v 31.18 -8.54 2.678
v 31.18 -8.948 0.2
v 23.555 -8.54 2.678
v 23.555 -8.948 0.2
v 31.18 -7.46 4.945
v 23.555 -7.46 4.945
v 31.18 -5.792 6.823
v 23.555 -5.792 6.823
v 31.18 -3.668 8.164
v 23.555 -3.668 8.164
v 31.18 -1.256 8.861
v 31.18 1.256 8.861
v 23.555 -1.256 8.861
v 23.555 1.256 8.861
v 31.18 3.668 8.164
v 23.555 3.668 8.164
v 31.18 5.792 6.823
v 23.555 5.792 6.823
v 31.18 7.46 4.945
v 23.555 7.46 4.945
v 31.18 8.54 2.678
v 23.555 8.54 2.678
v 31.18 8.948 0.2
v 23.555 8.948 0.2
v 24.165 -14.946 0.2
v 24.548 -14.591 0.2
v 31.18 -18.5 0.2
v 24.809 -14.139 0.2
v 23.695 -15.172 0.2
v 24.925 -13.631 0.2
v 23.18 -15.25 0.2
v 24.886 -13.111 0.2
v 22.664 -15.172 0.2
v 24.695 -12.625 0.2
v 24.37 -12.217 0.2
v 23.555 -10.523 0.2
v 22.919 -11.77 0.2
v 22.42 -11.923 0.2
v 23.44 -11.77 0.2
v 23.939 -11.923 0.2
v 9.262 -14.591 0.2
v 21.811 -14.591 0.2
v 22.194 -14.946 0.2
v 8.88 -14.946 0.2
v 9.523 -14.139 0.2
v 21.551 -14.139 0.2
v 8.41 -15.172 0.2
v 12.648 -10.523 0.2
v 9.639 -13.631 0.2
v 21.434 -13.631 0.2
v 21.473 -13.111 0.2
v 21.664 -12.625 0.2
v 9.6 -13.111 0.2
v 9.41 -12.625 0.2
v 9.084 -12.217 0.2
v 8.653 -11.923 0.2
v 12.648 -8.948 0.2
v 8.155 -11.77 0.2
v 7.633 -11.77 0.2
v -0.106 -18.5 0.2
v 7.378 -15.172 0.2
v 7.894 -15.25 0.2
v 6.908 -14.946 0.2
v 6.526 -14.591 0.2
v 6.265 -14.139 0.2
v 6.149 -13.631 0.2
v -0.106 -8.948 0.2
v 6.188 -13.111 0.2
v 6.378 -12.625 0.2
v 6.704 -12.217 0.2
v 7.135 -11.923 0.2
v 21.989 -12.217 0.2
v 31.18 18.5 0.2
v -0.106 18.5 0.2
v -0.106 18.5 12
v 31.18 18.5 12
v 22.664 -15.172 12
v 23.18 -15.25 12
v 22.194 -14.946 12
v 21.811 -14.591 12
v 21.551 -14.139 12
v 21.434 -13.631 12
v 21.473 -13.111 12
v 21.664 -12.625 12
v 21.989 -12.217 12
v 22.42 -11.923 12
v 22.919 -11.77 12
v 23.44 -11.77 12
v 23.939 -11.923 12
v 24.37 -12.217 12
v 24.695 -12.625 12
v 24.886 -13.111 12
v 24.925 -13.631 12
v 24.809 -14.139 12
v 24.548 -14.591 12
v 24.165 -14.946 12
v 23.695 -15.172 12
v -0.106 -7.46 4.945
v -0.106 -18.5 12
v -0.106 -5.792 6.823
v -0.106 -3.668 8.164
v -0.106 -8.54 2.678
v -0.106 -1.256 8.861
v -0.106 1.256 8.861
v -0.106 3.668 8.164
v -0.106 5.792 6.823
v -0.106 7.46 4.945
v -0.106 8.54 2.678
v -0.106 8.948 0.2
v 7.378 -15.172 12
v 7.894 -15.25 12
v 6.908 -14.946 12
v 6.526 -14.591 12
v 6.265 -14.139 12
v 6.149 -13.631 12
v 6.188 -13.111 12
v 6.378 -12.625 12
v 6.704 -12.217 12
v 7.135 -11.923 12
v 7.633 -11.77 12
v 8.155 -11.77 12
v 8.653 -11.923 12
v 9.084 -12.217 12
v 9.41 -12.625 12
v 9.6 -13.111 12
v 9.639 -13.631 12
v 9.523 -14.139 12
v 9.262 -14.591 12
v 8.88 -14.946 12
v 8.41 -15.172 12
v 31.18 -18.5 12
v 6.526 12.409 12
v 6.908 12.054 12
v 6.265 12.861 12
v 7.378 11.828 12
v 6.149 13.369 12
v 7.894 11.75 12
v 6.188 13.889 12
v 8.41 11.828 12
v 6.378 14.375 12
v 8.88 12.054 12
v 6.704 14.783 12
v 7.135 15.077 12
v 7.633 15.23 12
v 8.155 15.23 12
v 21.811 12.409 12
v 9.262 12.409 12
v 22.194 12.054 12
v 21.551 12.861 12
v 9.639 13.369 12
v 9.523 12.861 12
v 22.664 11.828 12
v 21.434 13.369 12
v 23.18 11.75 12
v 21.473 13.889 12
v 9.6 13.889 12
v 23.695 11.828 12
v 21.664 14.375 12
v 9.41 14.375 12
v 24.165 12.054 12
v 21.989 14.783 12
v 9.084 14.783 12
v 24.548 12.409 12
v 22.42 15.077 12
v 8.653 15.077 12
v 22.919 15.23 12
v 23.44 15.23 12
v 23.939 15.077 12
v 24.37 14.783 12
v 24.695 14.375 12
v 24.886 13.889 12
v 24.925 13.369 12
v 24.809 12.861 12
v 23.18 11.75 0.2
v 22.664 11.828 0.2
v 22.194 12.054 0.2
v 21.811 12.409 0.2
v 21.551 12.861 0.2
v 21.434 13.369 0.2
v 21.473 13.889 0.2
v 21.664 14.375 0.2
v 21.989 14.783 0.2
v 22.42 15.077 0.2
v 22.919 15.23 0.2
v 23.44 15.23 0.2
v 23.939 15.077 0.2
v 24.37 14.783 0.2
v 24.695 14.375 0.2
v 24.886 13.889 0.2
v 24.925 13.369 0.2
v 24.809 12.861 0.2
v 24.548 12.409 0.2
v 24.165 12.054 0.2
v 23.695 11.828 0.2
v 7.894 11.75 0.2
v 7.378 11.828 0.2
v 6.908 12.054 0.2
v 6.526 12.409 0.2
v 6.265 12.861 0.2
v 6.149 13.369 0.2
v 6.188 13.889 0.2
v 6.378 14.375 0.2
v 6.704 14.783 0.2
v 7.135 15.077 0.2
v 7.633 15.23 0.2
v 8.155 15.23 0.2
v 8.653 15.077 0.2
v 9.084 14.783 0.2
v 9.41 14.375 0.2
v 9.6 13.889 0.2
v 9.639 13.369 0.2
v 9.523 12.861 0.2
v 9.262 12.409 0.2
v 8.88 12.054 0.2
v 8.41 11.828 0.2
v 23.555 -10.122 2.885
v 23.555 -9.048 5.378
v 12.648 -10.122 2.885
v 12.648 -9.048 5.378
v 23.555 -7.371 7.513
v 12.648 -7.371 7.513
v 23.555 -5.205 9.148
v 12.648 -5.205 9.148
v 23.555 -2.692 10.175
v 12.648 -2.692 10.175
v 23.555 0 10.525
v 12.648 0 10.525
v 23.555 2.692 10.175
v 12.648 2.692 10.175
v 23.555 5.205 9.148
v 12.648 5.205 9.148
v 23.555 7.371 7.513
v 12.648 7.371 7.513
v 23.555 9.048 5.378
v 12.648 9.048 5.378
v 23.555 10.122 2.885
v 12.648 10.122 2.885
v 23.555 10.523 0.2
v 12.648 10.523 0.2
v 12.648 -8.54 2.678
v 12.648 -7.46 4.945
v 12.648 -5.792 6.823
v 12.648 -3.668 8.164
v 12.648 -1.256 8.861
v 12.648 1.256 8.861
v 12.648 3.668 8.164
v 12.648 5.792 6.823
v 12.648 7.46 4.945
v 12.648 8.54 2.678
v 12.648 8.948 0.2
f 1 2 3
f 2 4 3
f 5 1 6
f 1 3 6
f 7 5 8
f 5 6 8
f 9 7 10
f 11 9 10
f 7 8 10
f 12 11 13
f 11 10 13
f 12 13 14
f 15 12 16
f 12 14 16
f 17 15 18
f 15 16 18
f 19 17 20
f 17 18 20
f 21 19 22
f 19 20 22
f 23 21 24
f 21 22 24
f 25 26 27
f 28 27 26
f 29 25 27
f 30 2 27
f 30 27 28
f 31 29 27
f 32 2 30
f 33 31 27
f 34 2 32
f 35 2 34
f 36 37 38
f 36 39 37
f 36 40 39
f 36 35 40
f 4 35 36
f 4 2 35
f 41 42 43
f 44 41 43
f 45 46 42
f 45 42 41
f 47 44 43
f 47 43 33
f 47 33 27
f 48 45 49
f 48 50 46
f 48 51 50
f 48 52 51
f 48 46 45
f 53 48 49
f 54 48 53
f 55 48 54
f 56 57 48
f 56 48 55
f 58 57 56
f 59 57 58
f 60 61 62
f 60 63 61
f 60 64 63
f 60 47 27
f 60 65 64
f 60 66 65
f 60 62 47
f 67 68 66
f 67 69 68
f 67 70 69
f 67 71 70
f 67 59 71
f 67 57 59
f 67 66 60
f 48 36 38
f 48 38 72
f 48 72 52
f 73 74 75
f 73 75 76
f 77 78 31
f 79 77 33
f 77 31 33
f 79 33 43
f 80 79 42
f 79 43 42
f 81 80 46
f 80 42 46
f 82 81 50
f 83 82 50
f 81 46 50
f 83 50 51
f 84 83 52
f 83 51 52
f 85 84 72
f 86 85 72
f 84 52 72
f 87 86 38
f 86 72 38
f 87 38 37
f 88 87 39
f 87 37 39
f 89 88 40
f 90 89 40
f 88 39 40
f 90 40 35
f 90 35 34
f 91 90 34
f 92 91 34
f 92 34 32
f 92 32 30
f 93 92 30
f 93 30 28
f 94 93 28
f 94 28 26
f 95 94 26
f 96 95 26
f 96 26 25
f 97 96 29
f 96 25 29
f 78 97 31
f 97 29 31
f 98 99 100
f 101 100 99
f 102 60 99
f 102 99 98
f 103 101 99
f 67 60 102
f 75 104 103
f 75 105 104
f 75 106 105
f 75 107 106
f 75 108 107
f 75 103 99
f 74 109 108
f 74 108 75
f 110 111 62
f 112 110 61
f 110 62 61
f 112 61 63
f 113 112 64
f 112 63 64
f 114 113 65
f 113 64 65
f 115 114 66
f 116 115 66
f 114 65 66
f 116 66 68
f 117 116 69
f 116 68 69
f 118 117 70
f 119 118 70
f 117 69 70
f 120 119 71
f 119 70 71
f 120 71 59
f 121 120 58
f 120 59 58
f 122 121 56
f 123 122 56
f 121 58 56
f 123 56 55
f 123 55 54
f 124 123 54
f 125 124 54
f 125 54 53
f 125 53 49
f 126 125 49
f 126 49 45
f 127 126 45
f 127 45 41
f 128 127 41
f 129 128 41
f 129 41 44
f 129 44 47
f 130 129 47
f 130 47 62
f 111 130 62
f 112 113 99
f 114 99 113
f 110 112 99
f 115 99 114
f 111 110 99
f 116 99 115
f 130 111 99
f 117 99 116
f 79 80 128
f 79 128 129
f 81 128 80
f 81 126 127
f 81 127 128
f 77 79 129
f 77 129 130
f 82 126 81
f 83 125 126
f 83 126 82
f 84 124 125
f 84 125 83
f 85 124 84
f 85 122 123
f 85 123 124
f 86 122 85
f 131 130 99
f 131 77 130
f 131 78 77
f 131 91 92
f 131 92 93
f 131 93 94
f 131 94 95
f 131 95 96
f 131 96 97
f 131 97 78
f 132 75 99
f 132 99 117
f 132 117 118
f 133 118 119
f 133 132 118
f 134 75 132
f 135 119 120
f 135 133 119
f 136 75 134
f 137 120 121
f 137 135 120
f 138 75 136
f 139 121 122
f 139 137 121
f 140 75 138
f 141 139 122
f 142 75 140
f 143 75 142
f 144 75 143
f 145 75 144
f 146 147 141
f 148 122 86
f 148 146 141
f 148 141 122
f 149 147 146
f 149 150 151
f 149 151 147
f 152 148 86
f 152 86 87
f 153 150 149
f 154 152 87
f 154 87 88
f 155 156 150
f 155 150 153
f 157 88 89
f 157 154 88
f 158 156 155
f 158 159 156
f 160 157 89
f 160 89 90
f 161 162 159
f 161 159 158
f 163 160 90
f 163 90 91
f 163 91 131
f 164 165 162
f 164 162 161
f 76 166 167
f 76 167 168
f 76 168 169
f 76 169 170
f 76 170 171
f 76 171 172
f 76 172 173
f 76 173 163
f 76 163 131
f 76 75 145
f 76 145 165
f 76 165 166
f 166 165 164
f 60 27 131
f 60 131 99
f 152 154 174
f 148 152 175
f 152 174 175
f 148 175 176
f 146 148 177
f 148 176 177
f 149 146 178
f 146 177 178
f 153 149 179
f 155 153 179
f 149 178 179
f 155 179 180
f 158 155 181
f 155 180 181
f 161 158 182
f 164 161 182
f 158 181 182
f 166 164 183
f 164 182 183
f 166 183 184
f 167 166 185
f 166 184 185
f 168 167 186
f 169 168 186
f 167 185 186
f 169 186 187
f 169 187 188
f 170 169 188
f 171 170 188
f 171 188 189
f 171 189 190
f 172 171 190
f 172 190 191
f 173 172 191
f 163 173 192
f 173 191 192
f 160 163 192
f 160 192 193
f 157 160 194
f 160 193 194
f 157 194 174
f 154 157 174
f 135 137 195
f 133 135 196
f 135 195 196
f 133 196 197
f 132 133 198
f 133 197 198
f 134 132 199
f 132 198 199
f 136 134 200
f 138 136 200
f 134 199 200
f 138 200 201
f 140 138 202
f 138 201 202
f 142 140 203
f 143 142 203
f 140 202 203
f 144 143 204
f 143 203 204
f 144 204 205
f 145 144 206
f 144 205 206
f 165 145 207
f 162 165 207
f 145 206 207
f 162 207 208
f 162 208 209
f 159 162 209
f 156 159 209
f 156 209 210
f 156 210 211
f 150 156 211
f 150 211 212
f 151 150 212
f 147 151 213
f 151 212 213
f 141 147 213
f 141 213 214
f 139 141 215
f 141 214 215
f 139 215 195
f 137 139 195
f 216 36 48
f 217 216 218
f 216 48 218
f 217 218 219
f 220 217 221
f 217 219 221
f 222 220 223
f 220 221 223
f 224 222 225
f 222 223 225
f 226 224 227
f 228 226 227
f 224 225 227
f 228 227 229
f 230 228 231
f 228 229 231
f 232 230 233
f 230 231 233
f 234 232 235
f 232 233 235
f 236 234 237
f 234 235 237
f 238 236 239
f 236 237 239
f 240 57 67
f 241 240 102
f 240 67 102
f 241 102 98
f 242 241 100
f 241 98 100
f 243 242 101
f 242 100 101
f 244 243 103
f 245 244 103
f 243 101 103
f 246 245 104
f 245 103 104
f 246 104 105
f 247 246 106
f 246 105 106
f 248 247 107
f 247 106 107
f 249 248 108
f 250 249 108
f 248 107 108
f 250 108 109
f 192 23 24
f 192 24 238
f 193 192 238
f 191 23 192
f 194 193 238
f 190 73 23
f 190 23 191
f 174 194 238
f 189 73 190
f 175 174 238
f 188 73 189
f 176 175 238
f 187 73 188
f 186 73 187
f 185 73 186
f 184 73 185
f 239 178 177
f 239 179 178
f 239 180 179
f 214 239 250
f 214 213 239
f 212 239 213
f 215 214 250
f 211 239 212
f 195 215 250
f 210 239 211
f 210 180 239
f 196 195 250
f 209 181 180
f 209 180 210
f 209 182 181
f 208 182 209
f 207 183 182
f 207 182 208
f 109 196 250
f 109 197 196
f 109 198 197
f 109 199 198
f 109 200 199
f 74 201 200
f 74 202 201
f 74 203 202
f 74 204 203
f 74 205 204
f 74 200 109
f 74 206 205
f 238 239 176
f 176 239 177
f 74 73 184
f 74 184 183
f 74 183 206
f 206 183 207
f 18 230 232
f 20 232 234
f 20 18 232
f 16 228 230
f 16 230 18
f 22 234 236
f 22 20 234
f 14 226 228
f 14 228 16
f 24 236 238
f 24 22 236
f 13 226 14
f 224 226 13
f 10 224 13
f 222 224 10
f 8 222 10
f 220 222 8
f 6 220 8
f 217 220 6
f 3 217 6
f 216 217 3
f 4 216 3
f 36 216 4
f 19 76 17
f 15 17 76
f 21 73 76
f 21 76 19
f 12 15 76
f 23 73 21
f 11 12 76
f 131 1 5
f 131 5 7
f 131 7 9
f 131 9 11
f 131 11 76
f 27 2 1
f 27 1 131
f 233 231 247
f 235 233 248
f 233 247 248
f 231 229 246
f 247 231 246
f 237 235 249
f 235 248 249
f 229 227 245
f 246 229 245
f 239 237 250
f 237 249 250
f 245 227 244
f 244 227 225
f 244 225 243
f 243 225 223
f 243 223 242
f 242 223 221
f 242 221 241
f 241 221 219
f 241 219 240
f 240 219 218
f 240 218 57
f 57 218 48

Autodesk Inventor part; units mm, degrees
ref_plane "YZ Plane" through (0, 0, 0) normal (1, 0, 0) x (0, 1, 0)
ref_plane "XZ Plane" through (0, 0, 0) normal (0, 1, 0) x (-1, 0, 0)
ref_plane "Work Plane1" through (0, 0, 0) normal (0, 0, 1) x (1, 0, 0)
sketch "Sketch1" plane through (0, 0, 0) normal (0, 0, 1) x (1, 0, 0)
  circle A0 centre (13.9438, -25.4) radius 3.3782 construction
  line L0 (31.1796, -40) -> (-0.106, -40) construction
  line L1 (31.1796, -40) -> (31.1796, -8.95) construction
  line L2 (31.1796, -8.95) -> (23.5548, -8.95) construction
  line L3 (23.5548, -8.95) -> (23.5548, -10.525) construction
  line L4 (23.5548, -10.525) -> (12.648, -10.525) construction
  line L5 (12.648, -10.525) -> (12.648, -8.95) construction
  line L6 (12.648, -8.95) -> (-0.106, -8.95) construction
  line L7 (-0.106, -8.95) -> (-0.106, -40) construction
  circle A1 centre (13.9438, 25.4) radius 3.3782 construction
  line L8 (-0.106, 8.95) -> (12.648, 8.95) construction
  line L9 (12.648, 8.95) -> (12.648, 10.525) construction
  line L10 (12.648, 10.525) -> (23.5548, 10.525) construction
  line L11 (23.5548, 10.525) -> (23.5548, 8.95) construction
  line L12 (23.5548, 8.95) -> (31.1796, 8.95) construction
  line L13 (31.1796, 8.95) -> (31.1796, 45) construction
  line L14 (-0.106, 45) -> (31.1796, 45) construction
  line L15 (-0.106, 45) -> (-0.106, 8.95) construction
  line L16 (31.1796, -18.5) -> (-0.106, -18.5)
  line L17 (-0.106, -18.5) -> (-0.106, 18.5)
  line L18 (-0.106, 18.5) -> (31.1796, 18.5)
  line L19 (31.1796, 18.5) -> (31.1796, -18.5)
  line L20 (65.998, 0) -> (-177.7308, 0) construction
  circle A2 centre (13.9438, 25.4) radius 5.5 construction
  circle A3 centre (23.1796, -13.5) radius 2 projected
  circle A4 centre (7.894, -13.5) radius 2 projected
  circle A5 centre (7.894, 13.5) radius 2 projected
  circle A6 centre (23.1796, 13.5) radius 2 projected
  point P0 (0, 0)
  point P1 (13.9438, 22.0218)
  dimension "d2" = 37
  dimension "d3" = 11
ref_plane "Work Plane2" through (-142.9124, -40, 12) normal (0, 0, 1) x (1, 0, 0)
extrude "Extrusion1" add sketch "Sketch1" along normal up to surface (12 mm away) contours L16 L17 L18 L19 | A3 | A4 | A5 | A6
sketch "Sketch2" plane through (0, 0, 0) normal (0, 1, 0) x (-1, 0, 0)
  line L0 (1.106, -8.95) -> (1.106, 0)
  line L1 (1.106, 0) -> (-32.1796, 0)
  line L2 (-32.1796, 0) -> (-32.1796, -8.95)
  line L3 (-38.8367, 0) -> (7.7631, 0) construction
  line L4 (-31.1796, -8.95) -> (-31.1796, 0) construction
  line L5 (0.106, 7.5245) -> (0.106, -7.5245) construction
  line L6 (-31.1796, -8.95) -> (-23.5548, -8.95)
  line L7 (-23.5548, -10.525) -> (-12.648, -10.525)
  line L8 (-12.648, -8.95) -> (0.106, -8.95)
  line L9 (-31.1796, -8.95) -> (-32.1796, -8.95)
  line L10 (0.106, -8.95) -> (1.106, -8.95)
  line L11 (-23.5548, -8.95) -> (-23.5548, -10.525)
  line L12 (-12.648, -8.95) -> (-12.648, -10.525)
  point P0 (0, 0)
  point P1 (1.106, 0)
  point P2 (-32.1796, 0)
  dimension "d7" = 1
  dimension "d8" = 1
revolve "Revolution1" cut sketch "Sketch2" angle 360 about axis through (0, 0, 0) along (-1, 0, 0)
sketch "Sketch3" plane through (0, 0, 0) normal (0, 0, -1) x (-1, 0, 0)
  line L0 (0.106, 18.5) -> (-31.1796, 18.5)
  line L1 (-31.1796, 18.5) -> (-31.1796, -18.5)
  line L2 (-31.1796, -18.5) -> (0.106, -18.5)
  line L3 (0.106, -18.5) -> (0.106, 18.5)
  point P0 (0, 0)
extrude "Extrusion2" cut sketch "Sketch3" against normal blind 0.2
sketch "Sketch4" plane through (-0.106, 18.5, 12) normal (0, 0, 1) x (1, 0, 0)
  line L0 (31.2856, 0) -> (31.2856, -37) construction
  line L1 (0, 0) -> (31.2856, 0) construction
  line L2 (0, -37) -> (0, 0) construction
  line L3 (31.2856, -37) -> (0, -37) construction
  line L4 (31.2856, -5) -> (0, -5) construction
  line L5 (-6.2571, -18.5) -> (37.5427, -18.5) construction
  line L6 (31.2856, 0) -> (31.2856, -37) construction
  line L7 (0, -37) -> (0, 0) construction
  point P0 (0.106, -18.5)
  point P1 (23.2856, -5)
  point P2 (8, -5)
  point P3 (23.2856, -32)
  point P4 (8, -32)
  dimension "d12" = 8
  dimension "d13" = 8
  dimension "d14" = 5
hole "Thru Hole Holddown Screws M3" at (23.1796, 13.5, 12) at (7.894, 13.5, 12) at (23.1796, -13.5, 12) at (7.894, -13.5, 12) direction (0, 0, -1) diameter 3.5 end through all
equation "\"d13\" = d12"
properties part number "Cuvette Holder Transmit Holddown"
